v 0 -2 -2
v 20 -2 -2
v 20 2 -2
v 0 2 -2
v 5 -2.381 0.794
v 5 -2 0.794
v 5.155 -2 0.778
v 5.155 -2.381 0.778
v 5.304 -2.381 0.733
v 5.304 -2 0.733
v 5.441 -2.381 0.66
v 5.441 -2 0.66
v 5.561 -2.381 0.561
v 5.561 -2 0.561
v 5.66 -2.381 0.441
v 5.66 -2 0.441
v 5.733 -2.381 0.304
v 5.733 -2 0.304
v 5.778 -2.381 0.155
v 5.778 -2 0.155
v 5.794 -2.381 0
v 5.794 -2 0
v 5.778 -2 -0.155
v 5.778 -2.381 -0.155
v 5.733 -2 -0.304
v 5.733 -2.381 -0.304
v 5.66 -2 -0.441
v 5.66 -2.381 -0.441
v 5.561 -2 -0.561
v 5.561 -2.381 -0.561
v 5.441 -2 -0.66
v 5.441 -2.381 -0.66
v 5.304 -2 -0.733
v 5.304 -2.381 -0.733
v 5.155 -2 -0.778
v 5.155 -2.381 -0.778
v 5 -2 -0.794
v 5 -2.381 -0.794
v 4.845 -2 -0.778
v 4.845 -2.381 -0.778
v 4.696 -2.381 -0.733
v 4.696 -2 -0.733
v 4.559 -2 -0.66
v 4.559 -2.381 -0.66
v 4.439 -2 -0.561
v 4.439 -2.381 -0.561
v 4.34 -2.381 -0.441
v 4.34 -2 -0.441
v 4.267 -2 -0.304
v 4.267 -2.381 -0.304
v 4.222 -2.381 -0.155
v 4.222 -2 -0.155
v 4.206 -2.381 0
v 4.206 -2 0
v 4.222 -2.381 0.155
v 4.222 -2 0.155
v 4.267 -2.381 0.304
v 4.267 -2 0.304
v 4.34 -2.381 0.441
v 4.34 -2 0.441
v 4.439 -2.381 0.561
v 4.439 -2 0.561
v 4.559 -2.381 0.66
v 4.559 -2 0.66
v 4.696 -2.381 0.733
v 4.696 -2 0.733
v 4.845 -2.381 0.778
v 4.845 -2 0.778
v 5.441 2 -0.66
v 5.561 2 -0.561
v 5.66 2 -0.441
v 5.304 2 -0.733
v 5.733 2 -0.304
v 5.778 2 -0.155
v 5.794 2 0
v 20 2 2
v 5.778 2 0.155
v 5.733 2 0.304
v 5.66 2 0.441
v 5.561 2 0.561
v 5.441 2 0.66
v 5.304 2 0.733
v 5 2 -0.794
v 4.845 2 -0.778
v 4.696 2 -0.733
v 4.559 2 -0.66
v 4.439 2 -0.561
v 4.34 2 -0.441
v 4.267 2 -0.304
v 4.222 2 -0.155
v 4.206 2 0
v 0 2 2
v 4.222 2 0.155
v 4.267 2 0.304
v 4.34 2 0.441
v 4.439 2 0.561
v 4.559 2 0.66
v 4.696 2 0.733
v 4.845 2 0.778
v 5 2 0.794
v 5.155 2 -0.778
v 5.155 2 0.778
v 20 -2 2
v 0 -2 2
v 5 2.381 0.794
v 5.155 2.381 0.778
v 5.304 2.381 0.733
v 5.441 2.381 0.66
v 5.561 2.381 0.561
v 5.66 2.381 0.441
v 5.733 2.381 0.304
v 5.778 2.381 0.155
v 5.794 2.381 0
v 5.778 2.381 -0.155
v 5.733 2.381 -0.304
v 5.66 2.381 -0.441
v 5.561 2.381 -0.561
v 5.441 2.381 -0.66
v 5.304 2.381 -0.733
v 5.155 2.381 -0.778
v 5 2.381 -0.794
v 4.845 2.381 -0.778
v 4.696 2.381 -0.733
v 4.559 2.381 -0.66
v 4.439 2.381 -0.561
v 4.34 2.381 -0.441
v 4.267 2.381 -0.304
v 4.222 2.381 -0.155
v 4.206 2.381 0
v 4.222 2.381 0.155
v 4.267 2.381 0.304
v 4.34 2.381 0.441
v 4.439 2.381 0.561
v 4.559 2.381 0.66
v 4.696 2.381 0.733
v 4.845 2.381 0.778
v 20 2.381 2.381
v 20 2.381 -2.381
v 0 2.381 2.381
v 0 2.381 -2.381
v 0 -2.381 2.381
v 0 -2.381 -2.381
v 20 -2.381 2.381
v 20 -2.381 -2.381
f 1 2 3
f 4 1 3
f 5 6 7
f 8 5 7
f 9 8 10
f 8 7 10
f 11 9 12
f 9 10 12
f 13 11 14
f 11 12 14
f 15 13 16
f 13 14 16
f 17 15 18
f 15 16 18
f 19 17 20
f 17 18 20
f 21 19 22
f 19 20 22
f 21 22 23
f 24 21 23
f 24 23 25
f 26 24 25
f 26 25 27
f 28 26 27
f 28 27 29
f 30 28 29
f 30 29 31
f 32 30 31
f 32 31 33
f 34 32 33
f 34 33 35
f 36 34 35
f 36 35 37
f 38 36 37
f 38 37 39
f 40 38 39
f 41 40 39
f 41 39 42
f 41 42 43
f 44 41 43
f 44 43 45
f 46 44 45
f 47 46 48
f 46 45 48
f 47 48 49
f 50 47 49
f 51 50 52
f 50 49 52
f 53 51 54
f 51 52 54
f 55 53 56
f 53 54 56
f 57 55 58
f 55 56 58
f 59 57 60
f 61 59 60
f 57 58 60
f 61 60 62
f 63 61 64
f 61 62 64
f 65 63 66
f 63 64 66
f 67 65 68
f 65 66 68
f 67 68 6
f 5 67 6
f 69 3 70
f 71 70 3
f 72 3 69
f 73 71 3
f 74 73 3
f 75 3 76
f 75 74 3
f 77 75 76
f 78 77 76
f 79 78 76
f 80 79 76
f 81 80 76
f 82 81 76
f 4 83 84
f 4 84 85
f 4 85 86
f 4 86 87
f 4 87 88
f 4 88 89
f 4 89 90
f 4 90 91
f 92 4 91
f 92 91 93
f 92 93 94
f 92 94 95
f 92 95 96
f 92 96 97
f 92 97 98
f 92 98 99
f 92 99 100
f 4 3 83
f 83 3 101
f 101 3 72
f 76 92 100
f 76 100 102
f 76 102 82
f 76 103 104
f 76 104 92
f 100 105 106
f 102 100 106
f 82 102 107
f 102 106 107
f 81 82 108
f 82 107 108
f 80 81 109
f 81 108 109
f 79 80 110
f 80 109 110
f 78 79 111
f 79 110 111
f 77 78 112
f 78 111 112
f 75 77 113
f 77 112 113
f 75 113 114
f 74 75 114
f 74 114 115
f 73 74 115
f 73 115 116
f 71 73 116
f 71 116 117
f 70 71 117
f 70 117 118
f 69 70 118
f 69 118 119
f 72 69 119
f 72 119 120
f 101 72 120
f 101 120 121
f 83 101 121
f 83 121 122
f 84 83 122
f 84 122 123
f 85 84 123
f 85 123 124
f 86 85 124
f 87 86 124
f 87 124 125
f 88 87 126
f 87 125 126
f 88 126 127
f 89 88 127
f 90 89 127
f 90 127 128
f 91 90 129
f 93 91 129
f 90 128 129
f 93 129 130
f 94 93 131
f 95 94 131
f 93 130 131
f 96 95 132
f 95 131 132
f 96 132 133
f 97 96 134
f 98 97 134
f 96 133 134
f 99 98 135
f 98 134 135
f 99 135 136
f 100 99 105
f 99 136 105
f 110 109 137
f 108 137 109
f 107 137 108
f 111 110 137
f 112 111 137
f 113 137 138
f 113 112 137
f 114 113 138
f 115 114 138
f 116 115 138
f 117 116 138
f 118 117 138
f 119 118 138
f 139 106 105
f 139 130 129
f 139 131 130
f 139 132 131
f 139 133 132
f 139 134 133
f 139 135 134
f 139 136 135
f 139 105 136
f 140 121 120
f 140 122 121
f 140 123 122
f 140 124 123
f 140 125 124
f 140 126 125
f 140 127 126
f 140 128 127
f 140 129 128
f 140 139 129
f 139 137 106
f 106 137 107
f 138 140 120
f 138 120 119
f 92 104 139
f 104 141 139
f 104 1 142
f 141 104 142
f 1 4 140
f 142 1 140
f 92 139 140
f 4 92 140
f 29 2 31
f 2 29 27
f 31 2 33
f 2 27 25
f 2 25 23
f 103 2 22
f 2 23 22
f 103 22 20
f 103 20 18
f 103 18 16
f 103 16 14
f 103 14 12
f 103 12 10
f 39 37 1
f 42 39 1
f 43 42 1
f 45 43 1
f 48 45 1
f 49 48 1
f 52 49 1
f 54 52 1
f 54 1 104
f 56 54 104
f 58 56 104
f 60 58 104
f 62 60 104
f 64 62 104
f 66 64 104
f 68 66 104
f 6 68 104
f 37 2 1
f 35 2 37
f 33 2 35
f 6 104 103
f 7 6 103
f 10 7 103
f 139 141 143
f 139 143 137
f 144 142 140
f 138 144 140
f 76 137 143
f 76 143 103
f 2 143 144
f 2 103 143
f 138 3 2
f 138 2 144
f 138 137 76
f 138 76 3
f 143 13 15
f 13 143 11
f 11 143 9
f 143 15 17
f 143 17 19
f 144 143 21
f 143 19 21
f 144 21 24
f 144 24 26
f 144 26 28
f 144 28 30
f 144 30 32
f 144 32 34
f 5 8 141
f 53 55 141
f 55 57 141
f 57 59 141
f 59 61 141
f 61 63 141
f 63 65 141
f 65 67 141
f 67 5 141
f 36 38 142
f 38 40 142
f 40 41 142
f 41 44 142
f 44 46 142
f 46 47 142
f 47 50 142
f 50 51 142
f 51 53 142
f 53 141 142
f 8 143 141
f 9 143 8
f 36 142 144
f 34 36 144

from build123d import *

# Parameters (mm, degrees)
SKETCH1_W           = 4.7625
SKETCH1_H           = 4.7625
BOSS_EXTRUDE1_DEPTH = 20
SKETCH2_W           = 4
SKETCH2_H           = 4
CUT_EXTRUDE1_DEPTH  = 21.281536015
SKETCH3_R           = 0.79375
CUT_EXTRUDE2_DEPTH  = 10


with BuildPart() as part:
    # Sketch1 → Boss-Extrude1 (new body)
    with BuildSketch(Plane(origin=(0, 0, 0), x_dir=(0, 0, -1), z_dir=(1, 0, 0))):
        Rectangle(SKETCH1_W, SKETCH1_H)
    extrude(amount=BOSS_EXTRUDE1_DEPTH)

    # Sketch2 → Cut-Extrude1 (cut, through all)
    with BuildSketch(Plane.ZY):
        Rectangle(SKETCH2_W, SKETCH2_H)
    extrude(amount=-CUT_EXTRUDE1_DEPTH, mode=Mode.SUBTRACT)

    # Sketch3 → Cut-Extrude2 (cut)
    with BuildSketch(Plane(origin=(0, 2.38125, 0), x_dir=(1, 0, 0), z_dir=(0, 1, 0))):
        with Locations(Location((5, 0, 0), (0, 0, 270))):
            Circle(SKETCH3_R)
    extrude(amount=-CUT_EXTRUDE2_DEPTH, mode=Mode.SUBTRACT)


solid = part.part
